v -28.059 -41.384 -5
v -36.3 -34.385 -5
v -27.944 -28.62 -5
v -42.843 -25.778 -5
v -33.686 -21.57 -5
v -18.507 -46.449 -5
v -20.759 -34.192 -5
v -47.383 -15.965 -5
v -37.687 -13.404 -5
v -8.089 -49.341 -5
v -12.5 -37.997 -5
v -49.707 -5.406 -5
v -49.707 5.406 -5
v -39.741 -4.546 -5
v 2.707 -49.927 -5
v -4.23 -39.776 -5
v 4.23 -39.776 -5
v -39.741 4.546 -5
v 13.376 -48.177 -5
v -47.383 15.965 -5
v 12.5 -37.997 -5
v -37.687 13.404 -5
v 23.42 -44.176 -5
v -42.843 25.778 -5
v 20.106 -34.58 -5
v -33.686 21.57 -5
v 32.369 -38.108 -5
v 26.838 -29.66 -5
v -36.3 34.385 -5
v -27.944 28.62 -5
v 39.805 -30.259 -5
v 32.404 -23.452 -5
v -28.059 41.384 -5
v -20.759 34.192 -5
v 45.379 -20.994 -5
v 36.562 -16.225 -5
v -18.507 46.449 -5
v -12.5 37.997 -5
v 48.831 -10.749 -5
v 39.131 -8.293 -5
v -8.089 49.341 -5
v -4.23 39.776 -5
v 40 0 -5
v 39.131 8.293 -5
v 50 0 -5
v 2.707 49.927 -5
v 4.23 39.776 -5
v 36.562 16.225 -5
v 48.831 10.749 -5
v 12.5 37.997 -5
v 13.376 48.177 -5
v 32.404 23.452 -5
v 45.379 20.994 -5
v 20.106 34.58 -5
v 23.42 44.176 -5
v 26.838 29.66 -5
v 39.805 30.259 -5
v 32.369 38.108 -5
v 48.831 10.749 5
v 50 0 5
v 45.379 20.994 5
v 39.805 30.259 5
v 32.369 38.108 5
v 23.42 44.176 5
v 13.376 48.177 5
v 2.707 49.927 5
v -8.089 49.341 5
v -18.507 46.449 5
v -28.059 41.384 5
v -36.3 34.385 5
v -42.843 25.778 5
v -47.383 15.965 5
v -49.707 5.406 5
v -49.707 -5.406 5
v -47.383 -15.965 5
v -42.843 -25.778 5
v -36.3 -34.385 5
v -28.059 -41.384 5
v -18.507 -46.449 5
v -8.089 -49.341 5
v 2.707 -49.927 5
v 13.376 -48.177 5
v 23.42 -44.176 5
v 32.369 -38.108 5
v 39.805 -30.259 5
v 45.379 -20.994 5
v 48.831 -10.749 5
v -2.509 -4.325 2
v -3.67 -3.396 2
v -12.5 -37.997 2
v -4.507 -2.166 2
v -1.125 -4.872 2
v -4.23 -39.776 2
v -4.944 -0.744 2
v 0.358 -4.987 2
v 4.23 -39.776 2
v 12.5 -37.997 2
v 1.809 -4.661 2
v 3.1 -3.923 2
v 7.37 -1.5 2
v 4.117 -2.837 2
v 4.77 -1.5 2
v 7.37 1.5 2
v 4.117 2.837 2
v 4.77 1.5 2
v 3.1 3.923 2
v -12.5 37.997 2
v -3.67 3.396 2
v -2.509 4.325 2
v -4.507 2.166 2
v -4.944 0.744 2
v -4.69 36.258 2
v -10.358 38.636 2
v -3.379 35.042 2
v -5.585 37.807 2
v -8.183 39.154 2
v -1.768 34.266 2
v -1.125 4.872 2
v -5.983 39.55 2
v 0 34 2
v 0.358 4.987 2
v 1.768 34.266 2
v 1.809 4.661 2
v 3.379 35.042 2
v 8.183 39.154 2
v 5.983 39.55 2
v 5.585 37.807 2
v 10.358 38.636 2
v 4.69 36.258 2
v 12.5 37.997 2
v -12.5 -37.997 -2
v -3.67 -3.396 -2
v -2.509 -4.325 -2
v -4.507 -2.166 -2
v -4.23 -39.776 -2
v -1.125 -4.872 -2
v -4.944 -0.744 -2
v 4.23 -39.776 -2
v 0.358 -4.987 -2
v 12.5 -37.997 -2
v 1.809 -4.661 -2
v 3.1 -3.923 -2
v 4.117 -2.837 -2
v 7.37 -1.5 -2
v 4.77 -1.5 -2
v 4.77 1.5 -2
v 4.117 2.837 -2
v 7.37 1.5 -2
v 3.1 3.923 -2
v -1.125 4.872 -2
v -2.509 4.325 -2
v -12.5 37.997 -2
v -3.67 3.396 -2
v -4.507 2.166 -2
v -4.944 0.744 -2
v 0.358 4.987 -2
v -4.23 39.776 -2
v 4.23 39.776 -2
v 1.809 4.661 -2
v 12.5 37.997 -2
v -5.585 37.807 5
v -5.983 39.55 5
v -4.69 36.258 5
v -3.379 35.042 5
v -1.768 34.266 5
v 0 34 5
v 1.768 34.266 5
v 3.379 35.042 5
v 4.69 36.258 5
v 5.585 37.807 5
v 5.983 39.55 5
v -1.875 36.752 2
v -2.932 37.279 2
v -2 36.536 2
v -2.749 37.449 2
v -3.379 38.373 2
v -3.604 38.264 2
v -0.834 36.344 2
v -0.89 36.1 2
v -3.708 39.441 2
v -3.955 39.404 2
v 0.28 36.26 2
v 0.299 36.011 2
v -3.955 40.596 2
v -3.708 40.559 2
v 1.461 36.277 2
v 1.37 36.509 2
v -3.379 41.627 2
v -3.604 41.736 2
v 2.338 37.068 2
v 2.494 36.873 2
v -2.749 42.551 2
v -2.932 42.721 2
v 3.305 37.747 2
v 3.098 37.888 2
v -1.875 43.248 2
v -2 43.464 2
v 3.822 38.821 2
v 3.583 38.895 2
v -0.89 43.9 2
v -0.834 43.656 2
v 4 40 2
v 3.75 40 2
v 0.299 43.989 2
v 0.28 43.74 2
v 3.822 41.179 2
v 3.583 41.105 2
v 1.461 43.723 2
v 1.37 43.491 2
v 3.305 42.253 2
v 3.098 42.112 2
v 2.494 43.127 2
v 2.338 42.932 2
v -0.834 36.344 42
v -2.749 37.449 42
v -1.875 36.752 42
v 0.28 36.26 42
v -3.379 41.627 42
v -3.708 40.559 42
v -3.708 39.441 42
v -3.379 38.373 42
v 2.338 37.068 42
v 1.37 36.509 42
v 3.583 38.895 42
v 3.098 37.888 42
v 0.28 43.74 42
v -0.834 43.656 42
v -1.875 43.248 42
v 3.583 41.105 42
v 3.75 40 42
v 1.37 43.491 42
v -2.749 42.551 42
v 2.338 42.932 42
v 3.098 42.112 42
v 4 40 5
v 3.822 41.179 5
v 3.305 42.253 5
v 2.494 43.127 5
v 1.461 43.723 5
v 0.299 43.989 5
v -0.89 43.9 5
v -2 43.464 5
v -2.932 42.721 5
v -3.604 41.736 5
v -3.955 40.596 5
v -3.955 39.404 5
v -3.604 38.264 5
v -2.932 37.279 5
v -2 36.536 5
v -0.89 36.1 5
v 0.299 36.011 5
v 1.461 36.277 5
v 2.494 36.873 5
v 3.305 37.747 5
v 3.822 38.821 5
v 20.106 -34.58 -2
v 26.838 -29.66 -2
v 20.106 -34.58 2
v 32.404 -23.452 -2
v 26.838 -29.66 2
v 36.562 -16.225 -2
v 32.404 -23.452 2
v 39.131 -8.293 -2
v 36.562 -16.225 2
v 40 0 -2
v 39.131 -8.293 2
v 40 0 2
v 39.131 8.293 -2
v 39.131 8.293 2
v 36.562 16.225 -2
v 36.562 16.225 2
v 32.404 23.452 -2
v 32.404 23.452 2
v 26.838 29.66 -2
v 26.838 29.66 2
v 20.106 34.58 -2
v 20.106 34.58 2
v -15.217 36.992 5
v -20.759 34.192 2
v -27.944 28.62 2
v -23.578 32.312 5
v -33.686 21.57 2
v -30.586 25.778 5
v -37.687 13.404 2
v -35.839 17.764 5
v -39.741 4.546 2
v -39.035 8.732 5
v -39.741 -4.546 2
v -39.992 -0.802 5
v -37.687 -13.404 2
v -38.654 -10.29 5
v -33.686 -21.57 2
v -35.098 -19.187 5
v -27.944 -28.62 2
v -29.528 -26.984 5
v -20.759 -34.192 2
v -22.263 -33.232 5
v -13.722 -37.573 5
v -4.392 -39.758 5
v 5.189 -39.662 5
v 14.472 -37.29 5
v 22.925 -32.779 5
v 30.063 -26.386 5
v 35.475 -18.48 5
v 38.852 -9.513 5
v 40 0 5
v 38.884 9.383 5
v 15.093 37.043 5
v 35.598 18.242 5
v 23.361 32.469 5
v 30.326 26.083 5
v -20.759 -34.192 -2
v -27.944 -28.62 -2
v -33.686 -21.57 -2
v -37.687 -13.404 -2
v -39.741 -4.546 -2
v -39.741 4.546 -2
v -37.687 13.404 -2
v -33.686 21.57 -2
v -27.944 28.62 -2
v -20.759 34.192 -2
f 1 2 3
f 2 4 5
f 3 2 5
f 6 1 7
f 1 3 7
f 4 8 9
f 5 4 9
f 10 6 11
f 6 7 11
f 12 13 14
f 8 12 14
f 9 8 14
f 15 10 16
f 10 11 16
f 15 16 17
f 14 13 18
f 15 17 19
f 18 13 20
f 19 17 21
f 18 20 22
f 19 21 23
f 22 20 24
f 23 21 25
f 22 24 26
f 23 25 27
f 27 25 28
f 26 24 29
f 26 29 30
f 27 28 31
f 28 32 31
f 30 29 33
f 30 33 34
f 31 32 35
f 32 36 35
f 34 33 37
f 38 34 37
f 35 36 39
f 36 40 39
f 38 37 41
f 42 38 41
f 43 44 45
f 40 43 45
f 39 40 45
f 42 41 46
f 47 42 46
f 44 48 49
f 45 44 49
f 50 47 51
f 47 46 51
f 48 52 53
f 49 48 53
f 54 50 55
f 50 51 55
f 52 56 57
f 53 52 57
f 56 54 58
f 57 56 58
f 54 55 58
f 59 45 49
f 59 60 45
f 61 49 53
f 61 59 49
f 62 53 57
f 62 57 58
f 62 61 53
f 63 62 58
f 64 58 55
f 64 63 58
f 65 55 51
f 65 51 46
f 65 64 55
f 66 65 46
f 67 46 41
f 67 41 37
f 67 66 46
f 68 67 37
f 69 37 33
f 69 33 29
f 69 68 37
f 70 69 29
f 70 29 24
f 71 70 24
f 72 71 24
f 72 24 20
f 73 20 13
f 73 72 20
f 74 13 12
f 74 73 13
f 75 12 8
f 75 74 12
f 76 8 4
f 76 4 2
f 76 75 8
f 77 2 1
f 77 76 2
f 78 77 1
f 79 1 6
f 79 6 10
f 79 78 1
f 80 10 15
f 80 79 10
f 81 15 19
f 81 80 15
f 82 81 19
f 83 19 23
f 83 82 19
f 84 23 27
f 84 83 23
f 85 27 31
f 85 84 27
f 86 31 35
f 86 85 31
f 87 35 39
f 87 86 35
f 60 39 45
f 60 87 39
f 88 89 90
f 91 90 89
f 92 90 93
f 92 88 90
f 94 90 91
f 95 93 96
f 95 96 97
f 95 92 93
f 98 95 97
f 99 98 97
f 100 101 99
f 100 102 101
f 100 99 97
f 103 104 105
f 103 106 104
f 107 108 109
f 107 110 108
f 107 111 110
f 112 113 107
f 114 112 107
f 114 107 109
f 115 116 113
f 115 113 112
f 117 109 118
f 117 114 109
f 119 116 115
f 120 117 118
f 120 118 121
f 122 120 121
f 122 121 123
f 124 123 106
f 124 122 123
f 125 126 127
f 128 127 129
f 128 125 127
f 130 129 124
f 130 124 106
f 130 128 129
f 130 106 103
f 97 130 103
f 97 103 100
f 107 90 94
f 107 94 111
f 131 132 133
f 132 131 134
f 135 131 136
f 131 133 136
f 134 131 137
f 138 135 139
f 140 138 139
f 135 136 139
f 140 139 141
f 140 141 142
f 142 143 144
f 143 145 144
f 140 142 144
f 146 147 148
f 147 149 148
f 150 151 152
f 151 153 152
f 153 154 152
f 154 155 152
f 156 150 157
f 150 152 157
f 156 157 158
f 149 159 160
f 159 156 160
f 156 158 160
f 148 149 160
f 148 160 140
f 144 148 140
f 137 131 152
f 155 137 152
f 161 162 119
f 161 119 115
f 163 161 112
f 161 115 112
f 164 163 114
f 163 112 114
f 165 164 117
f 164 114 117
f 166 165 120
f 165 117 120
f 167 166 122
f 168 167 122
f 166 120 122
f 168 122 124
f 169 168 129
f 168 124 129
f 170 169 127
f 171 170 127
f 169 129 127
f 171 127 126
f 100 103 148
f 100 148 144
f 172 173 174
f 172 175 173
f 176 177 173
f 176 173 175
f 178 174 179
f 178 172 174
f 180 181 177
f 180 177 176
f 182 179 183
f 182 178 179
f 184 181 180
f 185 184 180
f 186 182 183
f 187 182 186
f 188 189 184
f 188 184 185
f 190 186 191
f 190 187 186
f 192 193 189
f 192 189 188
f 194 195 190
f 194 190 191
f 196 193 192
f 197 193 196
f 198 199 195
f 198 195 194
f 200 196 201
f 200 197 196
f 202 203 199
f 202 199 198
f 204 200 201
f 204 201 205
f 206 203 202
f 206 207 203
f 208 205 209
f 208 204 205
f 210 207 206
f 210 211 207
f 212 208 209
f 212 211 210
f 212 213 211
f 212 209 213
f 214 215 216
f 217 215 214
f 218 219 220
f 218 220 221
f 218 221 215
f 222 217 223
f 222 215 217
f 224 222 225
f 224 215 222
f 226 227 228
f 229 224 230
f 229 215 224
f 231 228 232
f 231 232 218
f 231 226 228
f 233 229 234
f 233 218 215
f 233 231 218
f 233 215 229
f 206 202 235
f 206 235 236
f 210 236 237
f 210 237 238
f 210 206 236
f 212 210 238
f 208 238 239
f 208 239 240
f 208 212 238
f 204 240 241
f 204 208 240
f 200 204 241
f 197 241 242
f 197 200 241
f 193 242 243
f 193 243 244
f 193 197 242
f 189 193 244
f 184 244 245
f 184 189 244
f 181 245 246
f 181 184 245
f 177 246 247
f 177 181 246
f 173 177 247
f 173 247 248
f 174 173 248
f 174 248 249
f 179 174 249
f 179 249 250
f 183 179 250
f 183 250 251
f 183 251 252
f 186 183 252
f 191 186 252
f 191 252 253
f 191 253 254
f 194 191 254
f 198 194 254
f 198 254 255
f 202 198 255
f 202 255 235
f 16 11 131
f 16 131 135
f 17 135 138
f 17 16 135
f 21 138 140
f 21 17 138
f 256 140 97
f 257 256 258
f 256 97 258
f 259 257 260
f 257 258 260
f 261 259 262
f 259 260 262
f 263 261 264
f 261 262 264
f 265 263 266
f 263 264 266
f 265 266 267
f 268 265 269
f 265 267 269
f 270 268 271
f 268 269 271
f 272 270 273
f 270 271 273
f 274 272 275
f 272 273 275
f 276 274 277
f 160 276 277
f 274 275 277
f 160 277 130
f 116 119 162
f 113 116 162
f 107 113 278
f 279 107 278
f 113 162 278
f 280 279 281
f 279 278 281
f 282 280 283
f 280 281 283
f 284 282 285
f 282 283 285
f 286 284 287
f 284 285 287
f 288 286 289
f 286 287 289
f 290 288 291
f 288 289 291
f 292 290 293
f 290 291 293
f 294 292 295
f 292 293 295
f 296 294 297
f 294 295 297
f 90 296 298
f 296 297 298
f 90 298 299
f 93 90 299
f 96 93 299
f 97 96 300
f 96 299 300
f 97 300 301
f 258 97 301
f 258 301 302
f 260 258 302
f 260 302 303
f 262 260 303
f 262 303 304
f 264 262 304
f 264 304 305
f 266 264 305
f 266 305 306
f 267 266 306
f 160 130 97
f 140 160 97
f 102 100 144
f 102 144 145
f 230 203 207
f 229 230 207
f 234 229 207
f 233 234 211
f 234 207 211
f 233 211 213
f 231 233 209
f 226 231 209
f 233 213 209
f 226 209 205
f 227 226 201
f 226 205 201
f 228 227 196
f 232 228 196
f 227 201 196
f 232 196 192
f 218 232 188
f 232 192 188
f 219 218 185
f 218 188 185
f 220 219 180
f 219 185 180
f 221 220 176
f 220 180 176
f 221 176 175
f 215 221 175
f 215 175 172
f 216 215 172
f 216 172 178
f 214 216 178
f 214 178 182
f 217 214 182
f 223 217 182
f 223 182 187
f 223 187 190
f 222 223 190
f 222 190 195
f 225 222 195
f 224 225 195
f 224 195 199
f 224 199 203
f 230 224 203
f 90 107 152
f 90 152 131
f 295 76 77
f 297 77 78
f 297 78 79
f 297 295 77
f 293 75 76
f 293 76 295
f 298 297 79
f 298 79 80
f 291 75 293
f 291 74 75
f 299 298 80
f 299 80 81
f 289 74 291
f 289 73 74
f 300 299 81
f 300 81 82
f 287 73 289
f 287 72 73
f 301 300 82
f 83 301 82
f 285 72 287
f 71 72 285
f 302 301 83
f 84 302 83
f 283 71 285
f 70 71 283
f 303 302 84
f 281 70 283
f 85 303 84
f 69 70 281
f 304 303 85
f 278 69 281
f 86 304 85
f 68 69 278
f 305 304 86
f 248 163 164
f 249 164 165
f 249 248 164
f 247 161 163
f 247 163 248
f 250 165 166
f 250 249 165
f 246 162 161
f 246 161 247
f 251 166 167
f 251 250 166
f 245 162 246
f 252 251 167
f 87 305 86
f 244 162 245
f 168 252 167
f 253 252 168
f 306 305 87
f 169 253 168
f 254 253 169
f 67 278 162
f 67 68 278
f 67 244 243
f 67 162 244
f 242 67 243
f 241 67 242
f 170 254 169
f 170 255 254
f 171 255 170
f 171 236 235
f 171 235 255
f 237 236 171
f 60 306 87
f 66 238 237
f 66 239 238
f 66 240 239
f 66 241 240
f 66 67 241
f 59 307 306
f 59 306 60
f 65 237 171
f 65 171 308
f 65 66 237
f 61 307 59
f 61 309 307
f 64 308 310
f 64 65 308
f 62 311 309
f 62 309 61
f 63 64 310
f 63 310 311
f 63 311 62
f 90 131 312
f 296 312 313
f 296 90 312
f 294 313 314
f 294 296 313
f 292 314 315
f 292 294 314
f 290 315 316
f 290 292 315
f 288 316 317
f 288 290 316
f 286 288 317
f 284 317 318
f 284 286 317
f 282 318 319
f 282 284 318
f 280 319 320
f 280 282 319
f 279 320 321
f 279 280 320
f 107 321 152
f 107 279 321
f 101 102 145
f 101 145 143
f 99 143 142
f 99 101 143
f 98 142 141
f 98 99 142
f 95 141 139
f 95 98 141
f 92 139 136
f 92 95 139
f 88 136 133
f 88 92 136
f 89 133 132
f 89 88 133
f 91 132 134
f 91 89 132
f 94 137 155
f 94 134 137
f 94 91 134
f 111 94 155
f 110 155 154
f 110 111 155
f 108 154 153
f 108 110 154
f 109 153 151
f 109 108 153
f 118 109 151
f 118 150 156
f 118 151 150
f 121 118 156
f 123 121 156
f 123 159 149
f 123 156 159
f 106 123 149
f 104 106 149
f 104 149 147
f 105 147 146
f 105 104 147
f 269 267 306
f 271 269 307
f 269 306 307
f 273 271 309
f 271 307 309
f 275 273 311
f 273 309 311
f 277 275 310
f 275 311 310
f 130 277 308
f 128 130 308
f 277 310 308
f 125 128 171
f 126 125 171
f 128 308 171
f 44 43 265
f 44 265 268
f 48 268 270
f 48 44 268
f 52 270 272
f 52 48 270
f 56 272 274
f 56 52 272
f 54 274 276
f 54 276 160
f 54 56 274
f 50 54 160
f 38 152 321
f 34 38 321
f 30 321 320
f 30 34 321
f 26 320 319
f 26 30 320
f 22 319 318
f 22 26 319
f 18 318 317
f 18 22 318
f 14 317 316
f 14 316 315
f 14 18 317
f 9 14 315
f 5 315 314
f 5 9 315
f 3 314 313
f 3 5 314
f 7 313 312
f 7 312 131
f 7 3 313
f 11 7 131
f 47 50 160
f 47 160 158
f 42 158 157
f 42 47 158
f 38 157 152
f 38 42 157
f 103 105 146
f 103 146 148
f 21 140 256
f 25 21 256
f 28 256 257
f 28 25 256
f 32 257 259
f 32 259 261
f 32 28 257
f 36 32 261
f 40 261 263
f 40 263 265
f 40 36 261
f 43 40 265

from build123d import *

# Parameters (mm, degrees)
SKETCH_1_R          = 50
EXTRUDE_1_DEPTH     = 5
SKETCH_2_R          = 40
CUT_EXTRUDE_1_DEPTH = 3
CUT_EXTRUDE_2_DEPTH = 10
SKETCH_4_R          = 6
SKETCH_4_R_2        = 4
EXTRUDE_2_DEPTH     = 3
SKETCH_5_R          = 4
CUT_EXTRUDE_3_DEPTH = 3
SKETCH_6_R          = 3.75
EXTRUDE_3_DEPTH     = 40


with BuildPart() as part:
    # 草图1 → 凸台-拉伸1 (new, symmetric)
    with BuildSketch(Plane.XY):
        Circle(SKETCH_1_R)
        with BuildLine():
            Line((4.769696007, 1.5), (7.369696007, 1.5))
            Line((7.369696007, 1.5), (7.369696007, -1.5))
            Line((7.369696007, -1.5), (4.769696007, -1.5))
            ThreePointArc((4.769696007, -1.5), (-5, 0), (4.769696007, 1.5))
        make_face(mode=Mode.SUBTRACT)
    extrude(amount=EXTRUDE_1_DEPTH, both=True)

    # 草图2 → 切除-拉伸1 (cut)
    with BuildSketch(Plane.XY.offset(5)):
        Circle(SKETCH_2_R)
    cut_extrude_1 = extrude(amount=-CUT_EXTRUDE_1_DEPTH, mode=Mode.SUBTRACT)

    # 镜向1: 切除-拉伸1 across plane
    add(cut_extrude_1.mirror(Plane.XY), mode=Mode.SUBTRACT)

    # 草图3 → 切除-拉伸2 (cut)
    with BuildSketch(Plane.XY.offset(2)):
        with BuildLine():
            Line((-12.5, 37.996710384), (-12.5, -37.996710384))
            ThreePointArc((-12.5, -37.996710384), (-40, 0), (-12.5, 37.996710384))
        make_face()
        with BuildLine():
            Line((12.5, 37.996710384), (12.5, -37.996710384))
            ThreePointArc((12.5, -37.996710384), (40, 0), (12.5, 37.996710384))
        make_face()
    extrude(amount=-CUT_EXTRUDE_2_DEPTH, mode=Mode.SUBTRACT)

    # 草图5 → 切除-拉伸3 (cut)
    with BuildSketch(Plane.XY.offset(5)):
        with Locations((0, 40)):
            Circle(SKETCH_5_R)
    extrude(amount=-CUT_EXTRUDE_3_DEPTH, mode=Mode.SUBTRACT)


with BuildPart() as body_2:
    # 草图4 → 凸台-拉伸2 (new body)
    with BuildSketch(Plane.XY.offset(2)):
        with Locations((0, 40)):
            Circle(SKETCH_4_R)
        with Locations((0, 40)):
            Circle(SKETCH_4_R_2, mode=Mode.SUBTRACT)
    extrude(amount=EXTRUDE_2_DEPTH)


    add(part.part)  # 凸台-拉伸3 merges part
    # 草图6 → 凸台-拉伸3 (add)
    with BuildSketch(Plane.XY.offset(2)):
        with Locations((0, 40)):
            Circle(SKETCH_6_R)
    extrude(amount=EXTRUDE_3_DEPTH)


solid = body_2.part
